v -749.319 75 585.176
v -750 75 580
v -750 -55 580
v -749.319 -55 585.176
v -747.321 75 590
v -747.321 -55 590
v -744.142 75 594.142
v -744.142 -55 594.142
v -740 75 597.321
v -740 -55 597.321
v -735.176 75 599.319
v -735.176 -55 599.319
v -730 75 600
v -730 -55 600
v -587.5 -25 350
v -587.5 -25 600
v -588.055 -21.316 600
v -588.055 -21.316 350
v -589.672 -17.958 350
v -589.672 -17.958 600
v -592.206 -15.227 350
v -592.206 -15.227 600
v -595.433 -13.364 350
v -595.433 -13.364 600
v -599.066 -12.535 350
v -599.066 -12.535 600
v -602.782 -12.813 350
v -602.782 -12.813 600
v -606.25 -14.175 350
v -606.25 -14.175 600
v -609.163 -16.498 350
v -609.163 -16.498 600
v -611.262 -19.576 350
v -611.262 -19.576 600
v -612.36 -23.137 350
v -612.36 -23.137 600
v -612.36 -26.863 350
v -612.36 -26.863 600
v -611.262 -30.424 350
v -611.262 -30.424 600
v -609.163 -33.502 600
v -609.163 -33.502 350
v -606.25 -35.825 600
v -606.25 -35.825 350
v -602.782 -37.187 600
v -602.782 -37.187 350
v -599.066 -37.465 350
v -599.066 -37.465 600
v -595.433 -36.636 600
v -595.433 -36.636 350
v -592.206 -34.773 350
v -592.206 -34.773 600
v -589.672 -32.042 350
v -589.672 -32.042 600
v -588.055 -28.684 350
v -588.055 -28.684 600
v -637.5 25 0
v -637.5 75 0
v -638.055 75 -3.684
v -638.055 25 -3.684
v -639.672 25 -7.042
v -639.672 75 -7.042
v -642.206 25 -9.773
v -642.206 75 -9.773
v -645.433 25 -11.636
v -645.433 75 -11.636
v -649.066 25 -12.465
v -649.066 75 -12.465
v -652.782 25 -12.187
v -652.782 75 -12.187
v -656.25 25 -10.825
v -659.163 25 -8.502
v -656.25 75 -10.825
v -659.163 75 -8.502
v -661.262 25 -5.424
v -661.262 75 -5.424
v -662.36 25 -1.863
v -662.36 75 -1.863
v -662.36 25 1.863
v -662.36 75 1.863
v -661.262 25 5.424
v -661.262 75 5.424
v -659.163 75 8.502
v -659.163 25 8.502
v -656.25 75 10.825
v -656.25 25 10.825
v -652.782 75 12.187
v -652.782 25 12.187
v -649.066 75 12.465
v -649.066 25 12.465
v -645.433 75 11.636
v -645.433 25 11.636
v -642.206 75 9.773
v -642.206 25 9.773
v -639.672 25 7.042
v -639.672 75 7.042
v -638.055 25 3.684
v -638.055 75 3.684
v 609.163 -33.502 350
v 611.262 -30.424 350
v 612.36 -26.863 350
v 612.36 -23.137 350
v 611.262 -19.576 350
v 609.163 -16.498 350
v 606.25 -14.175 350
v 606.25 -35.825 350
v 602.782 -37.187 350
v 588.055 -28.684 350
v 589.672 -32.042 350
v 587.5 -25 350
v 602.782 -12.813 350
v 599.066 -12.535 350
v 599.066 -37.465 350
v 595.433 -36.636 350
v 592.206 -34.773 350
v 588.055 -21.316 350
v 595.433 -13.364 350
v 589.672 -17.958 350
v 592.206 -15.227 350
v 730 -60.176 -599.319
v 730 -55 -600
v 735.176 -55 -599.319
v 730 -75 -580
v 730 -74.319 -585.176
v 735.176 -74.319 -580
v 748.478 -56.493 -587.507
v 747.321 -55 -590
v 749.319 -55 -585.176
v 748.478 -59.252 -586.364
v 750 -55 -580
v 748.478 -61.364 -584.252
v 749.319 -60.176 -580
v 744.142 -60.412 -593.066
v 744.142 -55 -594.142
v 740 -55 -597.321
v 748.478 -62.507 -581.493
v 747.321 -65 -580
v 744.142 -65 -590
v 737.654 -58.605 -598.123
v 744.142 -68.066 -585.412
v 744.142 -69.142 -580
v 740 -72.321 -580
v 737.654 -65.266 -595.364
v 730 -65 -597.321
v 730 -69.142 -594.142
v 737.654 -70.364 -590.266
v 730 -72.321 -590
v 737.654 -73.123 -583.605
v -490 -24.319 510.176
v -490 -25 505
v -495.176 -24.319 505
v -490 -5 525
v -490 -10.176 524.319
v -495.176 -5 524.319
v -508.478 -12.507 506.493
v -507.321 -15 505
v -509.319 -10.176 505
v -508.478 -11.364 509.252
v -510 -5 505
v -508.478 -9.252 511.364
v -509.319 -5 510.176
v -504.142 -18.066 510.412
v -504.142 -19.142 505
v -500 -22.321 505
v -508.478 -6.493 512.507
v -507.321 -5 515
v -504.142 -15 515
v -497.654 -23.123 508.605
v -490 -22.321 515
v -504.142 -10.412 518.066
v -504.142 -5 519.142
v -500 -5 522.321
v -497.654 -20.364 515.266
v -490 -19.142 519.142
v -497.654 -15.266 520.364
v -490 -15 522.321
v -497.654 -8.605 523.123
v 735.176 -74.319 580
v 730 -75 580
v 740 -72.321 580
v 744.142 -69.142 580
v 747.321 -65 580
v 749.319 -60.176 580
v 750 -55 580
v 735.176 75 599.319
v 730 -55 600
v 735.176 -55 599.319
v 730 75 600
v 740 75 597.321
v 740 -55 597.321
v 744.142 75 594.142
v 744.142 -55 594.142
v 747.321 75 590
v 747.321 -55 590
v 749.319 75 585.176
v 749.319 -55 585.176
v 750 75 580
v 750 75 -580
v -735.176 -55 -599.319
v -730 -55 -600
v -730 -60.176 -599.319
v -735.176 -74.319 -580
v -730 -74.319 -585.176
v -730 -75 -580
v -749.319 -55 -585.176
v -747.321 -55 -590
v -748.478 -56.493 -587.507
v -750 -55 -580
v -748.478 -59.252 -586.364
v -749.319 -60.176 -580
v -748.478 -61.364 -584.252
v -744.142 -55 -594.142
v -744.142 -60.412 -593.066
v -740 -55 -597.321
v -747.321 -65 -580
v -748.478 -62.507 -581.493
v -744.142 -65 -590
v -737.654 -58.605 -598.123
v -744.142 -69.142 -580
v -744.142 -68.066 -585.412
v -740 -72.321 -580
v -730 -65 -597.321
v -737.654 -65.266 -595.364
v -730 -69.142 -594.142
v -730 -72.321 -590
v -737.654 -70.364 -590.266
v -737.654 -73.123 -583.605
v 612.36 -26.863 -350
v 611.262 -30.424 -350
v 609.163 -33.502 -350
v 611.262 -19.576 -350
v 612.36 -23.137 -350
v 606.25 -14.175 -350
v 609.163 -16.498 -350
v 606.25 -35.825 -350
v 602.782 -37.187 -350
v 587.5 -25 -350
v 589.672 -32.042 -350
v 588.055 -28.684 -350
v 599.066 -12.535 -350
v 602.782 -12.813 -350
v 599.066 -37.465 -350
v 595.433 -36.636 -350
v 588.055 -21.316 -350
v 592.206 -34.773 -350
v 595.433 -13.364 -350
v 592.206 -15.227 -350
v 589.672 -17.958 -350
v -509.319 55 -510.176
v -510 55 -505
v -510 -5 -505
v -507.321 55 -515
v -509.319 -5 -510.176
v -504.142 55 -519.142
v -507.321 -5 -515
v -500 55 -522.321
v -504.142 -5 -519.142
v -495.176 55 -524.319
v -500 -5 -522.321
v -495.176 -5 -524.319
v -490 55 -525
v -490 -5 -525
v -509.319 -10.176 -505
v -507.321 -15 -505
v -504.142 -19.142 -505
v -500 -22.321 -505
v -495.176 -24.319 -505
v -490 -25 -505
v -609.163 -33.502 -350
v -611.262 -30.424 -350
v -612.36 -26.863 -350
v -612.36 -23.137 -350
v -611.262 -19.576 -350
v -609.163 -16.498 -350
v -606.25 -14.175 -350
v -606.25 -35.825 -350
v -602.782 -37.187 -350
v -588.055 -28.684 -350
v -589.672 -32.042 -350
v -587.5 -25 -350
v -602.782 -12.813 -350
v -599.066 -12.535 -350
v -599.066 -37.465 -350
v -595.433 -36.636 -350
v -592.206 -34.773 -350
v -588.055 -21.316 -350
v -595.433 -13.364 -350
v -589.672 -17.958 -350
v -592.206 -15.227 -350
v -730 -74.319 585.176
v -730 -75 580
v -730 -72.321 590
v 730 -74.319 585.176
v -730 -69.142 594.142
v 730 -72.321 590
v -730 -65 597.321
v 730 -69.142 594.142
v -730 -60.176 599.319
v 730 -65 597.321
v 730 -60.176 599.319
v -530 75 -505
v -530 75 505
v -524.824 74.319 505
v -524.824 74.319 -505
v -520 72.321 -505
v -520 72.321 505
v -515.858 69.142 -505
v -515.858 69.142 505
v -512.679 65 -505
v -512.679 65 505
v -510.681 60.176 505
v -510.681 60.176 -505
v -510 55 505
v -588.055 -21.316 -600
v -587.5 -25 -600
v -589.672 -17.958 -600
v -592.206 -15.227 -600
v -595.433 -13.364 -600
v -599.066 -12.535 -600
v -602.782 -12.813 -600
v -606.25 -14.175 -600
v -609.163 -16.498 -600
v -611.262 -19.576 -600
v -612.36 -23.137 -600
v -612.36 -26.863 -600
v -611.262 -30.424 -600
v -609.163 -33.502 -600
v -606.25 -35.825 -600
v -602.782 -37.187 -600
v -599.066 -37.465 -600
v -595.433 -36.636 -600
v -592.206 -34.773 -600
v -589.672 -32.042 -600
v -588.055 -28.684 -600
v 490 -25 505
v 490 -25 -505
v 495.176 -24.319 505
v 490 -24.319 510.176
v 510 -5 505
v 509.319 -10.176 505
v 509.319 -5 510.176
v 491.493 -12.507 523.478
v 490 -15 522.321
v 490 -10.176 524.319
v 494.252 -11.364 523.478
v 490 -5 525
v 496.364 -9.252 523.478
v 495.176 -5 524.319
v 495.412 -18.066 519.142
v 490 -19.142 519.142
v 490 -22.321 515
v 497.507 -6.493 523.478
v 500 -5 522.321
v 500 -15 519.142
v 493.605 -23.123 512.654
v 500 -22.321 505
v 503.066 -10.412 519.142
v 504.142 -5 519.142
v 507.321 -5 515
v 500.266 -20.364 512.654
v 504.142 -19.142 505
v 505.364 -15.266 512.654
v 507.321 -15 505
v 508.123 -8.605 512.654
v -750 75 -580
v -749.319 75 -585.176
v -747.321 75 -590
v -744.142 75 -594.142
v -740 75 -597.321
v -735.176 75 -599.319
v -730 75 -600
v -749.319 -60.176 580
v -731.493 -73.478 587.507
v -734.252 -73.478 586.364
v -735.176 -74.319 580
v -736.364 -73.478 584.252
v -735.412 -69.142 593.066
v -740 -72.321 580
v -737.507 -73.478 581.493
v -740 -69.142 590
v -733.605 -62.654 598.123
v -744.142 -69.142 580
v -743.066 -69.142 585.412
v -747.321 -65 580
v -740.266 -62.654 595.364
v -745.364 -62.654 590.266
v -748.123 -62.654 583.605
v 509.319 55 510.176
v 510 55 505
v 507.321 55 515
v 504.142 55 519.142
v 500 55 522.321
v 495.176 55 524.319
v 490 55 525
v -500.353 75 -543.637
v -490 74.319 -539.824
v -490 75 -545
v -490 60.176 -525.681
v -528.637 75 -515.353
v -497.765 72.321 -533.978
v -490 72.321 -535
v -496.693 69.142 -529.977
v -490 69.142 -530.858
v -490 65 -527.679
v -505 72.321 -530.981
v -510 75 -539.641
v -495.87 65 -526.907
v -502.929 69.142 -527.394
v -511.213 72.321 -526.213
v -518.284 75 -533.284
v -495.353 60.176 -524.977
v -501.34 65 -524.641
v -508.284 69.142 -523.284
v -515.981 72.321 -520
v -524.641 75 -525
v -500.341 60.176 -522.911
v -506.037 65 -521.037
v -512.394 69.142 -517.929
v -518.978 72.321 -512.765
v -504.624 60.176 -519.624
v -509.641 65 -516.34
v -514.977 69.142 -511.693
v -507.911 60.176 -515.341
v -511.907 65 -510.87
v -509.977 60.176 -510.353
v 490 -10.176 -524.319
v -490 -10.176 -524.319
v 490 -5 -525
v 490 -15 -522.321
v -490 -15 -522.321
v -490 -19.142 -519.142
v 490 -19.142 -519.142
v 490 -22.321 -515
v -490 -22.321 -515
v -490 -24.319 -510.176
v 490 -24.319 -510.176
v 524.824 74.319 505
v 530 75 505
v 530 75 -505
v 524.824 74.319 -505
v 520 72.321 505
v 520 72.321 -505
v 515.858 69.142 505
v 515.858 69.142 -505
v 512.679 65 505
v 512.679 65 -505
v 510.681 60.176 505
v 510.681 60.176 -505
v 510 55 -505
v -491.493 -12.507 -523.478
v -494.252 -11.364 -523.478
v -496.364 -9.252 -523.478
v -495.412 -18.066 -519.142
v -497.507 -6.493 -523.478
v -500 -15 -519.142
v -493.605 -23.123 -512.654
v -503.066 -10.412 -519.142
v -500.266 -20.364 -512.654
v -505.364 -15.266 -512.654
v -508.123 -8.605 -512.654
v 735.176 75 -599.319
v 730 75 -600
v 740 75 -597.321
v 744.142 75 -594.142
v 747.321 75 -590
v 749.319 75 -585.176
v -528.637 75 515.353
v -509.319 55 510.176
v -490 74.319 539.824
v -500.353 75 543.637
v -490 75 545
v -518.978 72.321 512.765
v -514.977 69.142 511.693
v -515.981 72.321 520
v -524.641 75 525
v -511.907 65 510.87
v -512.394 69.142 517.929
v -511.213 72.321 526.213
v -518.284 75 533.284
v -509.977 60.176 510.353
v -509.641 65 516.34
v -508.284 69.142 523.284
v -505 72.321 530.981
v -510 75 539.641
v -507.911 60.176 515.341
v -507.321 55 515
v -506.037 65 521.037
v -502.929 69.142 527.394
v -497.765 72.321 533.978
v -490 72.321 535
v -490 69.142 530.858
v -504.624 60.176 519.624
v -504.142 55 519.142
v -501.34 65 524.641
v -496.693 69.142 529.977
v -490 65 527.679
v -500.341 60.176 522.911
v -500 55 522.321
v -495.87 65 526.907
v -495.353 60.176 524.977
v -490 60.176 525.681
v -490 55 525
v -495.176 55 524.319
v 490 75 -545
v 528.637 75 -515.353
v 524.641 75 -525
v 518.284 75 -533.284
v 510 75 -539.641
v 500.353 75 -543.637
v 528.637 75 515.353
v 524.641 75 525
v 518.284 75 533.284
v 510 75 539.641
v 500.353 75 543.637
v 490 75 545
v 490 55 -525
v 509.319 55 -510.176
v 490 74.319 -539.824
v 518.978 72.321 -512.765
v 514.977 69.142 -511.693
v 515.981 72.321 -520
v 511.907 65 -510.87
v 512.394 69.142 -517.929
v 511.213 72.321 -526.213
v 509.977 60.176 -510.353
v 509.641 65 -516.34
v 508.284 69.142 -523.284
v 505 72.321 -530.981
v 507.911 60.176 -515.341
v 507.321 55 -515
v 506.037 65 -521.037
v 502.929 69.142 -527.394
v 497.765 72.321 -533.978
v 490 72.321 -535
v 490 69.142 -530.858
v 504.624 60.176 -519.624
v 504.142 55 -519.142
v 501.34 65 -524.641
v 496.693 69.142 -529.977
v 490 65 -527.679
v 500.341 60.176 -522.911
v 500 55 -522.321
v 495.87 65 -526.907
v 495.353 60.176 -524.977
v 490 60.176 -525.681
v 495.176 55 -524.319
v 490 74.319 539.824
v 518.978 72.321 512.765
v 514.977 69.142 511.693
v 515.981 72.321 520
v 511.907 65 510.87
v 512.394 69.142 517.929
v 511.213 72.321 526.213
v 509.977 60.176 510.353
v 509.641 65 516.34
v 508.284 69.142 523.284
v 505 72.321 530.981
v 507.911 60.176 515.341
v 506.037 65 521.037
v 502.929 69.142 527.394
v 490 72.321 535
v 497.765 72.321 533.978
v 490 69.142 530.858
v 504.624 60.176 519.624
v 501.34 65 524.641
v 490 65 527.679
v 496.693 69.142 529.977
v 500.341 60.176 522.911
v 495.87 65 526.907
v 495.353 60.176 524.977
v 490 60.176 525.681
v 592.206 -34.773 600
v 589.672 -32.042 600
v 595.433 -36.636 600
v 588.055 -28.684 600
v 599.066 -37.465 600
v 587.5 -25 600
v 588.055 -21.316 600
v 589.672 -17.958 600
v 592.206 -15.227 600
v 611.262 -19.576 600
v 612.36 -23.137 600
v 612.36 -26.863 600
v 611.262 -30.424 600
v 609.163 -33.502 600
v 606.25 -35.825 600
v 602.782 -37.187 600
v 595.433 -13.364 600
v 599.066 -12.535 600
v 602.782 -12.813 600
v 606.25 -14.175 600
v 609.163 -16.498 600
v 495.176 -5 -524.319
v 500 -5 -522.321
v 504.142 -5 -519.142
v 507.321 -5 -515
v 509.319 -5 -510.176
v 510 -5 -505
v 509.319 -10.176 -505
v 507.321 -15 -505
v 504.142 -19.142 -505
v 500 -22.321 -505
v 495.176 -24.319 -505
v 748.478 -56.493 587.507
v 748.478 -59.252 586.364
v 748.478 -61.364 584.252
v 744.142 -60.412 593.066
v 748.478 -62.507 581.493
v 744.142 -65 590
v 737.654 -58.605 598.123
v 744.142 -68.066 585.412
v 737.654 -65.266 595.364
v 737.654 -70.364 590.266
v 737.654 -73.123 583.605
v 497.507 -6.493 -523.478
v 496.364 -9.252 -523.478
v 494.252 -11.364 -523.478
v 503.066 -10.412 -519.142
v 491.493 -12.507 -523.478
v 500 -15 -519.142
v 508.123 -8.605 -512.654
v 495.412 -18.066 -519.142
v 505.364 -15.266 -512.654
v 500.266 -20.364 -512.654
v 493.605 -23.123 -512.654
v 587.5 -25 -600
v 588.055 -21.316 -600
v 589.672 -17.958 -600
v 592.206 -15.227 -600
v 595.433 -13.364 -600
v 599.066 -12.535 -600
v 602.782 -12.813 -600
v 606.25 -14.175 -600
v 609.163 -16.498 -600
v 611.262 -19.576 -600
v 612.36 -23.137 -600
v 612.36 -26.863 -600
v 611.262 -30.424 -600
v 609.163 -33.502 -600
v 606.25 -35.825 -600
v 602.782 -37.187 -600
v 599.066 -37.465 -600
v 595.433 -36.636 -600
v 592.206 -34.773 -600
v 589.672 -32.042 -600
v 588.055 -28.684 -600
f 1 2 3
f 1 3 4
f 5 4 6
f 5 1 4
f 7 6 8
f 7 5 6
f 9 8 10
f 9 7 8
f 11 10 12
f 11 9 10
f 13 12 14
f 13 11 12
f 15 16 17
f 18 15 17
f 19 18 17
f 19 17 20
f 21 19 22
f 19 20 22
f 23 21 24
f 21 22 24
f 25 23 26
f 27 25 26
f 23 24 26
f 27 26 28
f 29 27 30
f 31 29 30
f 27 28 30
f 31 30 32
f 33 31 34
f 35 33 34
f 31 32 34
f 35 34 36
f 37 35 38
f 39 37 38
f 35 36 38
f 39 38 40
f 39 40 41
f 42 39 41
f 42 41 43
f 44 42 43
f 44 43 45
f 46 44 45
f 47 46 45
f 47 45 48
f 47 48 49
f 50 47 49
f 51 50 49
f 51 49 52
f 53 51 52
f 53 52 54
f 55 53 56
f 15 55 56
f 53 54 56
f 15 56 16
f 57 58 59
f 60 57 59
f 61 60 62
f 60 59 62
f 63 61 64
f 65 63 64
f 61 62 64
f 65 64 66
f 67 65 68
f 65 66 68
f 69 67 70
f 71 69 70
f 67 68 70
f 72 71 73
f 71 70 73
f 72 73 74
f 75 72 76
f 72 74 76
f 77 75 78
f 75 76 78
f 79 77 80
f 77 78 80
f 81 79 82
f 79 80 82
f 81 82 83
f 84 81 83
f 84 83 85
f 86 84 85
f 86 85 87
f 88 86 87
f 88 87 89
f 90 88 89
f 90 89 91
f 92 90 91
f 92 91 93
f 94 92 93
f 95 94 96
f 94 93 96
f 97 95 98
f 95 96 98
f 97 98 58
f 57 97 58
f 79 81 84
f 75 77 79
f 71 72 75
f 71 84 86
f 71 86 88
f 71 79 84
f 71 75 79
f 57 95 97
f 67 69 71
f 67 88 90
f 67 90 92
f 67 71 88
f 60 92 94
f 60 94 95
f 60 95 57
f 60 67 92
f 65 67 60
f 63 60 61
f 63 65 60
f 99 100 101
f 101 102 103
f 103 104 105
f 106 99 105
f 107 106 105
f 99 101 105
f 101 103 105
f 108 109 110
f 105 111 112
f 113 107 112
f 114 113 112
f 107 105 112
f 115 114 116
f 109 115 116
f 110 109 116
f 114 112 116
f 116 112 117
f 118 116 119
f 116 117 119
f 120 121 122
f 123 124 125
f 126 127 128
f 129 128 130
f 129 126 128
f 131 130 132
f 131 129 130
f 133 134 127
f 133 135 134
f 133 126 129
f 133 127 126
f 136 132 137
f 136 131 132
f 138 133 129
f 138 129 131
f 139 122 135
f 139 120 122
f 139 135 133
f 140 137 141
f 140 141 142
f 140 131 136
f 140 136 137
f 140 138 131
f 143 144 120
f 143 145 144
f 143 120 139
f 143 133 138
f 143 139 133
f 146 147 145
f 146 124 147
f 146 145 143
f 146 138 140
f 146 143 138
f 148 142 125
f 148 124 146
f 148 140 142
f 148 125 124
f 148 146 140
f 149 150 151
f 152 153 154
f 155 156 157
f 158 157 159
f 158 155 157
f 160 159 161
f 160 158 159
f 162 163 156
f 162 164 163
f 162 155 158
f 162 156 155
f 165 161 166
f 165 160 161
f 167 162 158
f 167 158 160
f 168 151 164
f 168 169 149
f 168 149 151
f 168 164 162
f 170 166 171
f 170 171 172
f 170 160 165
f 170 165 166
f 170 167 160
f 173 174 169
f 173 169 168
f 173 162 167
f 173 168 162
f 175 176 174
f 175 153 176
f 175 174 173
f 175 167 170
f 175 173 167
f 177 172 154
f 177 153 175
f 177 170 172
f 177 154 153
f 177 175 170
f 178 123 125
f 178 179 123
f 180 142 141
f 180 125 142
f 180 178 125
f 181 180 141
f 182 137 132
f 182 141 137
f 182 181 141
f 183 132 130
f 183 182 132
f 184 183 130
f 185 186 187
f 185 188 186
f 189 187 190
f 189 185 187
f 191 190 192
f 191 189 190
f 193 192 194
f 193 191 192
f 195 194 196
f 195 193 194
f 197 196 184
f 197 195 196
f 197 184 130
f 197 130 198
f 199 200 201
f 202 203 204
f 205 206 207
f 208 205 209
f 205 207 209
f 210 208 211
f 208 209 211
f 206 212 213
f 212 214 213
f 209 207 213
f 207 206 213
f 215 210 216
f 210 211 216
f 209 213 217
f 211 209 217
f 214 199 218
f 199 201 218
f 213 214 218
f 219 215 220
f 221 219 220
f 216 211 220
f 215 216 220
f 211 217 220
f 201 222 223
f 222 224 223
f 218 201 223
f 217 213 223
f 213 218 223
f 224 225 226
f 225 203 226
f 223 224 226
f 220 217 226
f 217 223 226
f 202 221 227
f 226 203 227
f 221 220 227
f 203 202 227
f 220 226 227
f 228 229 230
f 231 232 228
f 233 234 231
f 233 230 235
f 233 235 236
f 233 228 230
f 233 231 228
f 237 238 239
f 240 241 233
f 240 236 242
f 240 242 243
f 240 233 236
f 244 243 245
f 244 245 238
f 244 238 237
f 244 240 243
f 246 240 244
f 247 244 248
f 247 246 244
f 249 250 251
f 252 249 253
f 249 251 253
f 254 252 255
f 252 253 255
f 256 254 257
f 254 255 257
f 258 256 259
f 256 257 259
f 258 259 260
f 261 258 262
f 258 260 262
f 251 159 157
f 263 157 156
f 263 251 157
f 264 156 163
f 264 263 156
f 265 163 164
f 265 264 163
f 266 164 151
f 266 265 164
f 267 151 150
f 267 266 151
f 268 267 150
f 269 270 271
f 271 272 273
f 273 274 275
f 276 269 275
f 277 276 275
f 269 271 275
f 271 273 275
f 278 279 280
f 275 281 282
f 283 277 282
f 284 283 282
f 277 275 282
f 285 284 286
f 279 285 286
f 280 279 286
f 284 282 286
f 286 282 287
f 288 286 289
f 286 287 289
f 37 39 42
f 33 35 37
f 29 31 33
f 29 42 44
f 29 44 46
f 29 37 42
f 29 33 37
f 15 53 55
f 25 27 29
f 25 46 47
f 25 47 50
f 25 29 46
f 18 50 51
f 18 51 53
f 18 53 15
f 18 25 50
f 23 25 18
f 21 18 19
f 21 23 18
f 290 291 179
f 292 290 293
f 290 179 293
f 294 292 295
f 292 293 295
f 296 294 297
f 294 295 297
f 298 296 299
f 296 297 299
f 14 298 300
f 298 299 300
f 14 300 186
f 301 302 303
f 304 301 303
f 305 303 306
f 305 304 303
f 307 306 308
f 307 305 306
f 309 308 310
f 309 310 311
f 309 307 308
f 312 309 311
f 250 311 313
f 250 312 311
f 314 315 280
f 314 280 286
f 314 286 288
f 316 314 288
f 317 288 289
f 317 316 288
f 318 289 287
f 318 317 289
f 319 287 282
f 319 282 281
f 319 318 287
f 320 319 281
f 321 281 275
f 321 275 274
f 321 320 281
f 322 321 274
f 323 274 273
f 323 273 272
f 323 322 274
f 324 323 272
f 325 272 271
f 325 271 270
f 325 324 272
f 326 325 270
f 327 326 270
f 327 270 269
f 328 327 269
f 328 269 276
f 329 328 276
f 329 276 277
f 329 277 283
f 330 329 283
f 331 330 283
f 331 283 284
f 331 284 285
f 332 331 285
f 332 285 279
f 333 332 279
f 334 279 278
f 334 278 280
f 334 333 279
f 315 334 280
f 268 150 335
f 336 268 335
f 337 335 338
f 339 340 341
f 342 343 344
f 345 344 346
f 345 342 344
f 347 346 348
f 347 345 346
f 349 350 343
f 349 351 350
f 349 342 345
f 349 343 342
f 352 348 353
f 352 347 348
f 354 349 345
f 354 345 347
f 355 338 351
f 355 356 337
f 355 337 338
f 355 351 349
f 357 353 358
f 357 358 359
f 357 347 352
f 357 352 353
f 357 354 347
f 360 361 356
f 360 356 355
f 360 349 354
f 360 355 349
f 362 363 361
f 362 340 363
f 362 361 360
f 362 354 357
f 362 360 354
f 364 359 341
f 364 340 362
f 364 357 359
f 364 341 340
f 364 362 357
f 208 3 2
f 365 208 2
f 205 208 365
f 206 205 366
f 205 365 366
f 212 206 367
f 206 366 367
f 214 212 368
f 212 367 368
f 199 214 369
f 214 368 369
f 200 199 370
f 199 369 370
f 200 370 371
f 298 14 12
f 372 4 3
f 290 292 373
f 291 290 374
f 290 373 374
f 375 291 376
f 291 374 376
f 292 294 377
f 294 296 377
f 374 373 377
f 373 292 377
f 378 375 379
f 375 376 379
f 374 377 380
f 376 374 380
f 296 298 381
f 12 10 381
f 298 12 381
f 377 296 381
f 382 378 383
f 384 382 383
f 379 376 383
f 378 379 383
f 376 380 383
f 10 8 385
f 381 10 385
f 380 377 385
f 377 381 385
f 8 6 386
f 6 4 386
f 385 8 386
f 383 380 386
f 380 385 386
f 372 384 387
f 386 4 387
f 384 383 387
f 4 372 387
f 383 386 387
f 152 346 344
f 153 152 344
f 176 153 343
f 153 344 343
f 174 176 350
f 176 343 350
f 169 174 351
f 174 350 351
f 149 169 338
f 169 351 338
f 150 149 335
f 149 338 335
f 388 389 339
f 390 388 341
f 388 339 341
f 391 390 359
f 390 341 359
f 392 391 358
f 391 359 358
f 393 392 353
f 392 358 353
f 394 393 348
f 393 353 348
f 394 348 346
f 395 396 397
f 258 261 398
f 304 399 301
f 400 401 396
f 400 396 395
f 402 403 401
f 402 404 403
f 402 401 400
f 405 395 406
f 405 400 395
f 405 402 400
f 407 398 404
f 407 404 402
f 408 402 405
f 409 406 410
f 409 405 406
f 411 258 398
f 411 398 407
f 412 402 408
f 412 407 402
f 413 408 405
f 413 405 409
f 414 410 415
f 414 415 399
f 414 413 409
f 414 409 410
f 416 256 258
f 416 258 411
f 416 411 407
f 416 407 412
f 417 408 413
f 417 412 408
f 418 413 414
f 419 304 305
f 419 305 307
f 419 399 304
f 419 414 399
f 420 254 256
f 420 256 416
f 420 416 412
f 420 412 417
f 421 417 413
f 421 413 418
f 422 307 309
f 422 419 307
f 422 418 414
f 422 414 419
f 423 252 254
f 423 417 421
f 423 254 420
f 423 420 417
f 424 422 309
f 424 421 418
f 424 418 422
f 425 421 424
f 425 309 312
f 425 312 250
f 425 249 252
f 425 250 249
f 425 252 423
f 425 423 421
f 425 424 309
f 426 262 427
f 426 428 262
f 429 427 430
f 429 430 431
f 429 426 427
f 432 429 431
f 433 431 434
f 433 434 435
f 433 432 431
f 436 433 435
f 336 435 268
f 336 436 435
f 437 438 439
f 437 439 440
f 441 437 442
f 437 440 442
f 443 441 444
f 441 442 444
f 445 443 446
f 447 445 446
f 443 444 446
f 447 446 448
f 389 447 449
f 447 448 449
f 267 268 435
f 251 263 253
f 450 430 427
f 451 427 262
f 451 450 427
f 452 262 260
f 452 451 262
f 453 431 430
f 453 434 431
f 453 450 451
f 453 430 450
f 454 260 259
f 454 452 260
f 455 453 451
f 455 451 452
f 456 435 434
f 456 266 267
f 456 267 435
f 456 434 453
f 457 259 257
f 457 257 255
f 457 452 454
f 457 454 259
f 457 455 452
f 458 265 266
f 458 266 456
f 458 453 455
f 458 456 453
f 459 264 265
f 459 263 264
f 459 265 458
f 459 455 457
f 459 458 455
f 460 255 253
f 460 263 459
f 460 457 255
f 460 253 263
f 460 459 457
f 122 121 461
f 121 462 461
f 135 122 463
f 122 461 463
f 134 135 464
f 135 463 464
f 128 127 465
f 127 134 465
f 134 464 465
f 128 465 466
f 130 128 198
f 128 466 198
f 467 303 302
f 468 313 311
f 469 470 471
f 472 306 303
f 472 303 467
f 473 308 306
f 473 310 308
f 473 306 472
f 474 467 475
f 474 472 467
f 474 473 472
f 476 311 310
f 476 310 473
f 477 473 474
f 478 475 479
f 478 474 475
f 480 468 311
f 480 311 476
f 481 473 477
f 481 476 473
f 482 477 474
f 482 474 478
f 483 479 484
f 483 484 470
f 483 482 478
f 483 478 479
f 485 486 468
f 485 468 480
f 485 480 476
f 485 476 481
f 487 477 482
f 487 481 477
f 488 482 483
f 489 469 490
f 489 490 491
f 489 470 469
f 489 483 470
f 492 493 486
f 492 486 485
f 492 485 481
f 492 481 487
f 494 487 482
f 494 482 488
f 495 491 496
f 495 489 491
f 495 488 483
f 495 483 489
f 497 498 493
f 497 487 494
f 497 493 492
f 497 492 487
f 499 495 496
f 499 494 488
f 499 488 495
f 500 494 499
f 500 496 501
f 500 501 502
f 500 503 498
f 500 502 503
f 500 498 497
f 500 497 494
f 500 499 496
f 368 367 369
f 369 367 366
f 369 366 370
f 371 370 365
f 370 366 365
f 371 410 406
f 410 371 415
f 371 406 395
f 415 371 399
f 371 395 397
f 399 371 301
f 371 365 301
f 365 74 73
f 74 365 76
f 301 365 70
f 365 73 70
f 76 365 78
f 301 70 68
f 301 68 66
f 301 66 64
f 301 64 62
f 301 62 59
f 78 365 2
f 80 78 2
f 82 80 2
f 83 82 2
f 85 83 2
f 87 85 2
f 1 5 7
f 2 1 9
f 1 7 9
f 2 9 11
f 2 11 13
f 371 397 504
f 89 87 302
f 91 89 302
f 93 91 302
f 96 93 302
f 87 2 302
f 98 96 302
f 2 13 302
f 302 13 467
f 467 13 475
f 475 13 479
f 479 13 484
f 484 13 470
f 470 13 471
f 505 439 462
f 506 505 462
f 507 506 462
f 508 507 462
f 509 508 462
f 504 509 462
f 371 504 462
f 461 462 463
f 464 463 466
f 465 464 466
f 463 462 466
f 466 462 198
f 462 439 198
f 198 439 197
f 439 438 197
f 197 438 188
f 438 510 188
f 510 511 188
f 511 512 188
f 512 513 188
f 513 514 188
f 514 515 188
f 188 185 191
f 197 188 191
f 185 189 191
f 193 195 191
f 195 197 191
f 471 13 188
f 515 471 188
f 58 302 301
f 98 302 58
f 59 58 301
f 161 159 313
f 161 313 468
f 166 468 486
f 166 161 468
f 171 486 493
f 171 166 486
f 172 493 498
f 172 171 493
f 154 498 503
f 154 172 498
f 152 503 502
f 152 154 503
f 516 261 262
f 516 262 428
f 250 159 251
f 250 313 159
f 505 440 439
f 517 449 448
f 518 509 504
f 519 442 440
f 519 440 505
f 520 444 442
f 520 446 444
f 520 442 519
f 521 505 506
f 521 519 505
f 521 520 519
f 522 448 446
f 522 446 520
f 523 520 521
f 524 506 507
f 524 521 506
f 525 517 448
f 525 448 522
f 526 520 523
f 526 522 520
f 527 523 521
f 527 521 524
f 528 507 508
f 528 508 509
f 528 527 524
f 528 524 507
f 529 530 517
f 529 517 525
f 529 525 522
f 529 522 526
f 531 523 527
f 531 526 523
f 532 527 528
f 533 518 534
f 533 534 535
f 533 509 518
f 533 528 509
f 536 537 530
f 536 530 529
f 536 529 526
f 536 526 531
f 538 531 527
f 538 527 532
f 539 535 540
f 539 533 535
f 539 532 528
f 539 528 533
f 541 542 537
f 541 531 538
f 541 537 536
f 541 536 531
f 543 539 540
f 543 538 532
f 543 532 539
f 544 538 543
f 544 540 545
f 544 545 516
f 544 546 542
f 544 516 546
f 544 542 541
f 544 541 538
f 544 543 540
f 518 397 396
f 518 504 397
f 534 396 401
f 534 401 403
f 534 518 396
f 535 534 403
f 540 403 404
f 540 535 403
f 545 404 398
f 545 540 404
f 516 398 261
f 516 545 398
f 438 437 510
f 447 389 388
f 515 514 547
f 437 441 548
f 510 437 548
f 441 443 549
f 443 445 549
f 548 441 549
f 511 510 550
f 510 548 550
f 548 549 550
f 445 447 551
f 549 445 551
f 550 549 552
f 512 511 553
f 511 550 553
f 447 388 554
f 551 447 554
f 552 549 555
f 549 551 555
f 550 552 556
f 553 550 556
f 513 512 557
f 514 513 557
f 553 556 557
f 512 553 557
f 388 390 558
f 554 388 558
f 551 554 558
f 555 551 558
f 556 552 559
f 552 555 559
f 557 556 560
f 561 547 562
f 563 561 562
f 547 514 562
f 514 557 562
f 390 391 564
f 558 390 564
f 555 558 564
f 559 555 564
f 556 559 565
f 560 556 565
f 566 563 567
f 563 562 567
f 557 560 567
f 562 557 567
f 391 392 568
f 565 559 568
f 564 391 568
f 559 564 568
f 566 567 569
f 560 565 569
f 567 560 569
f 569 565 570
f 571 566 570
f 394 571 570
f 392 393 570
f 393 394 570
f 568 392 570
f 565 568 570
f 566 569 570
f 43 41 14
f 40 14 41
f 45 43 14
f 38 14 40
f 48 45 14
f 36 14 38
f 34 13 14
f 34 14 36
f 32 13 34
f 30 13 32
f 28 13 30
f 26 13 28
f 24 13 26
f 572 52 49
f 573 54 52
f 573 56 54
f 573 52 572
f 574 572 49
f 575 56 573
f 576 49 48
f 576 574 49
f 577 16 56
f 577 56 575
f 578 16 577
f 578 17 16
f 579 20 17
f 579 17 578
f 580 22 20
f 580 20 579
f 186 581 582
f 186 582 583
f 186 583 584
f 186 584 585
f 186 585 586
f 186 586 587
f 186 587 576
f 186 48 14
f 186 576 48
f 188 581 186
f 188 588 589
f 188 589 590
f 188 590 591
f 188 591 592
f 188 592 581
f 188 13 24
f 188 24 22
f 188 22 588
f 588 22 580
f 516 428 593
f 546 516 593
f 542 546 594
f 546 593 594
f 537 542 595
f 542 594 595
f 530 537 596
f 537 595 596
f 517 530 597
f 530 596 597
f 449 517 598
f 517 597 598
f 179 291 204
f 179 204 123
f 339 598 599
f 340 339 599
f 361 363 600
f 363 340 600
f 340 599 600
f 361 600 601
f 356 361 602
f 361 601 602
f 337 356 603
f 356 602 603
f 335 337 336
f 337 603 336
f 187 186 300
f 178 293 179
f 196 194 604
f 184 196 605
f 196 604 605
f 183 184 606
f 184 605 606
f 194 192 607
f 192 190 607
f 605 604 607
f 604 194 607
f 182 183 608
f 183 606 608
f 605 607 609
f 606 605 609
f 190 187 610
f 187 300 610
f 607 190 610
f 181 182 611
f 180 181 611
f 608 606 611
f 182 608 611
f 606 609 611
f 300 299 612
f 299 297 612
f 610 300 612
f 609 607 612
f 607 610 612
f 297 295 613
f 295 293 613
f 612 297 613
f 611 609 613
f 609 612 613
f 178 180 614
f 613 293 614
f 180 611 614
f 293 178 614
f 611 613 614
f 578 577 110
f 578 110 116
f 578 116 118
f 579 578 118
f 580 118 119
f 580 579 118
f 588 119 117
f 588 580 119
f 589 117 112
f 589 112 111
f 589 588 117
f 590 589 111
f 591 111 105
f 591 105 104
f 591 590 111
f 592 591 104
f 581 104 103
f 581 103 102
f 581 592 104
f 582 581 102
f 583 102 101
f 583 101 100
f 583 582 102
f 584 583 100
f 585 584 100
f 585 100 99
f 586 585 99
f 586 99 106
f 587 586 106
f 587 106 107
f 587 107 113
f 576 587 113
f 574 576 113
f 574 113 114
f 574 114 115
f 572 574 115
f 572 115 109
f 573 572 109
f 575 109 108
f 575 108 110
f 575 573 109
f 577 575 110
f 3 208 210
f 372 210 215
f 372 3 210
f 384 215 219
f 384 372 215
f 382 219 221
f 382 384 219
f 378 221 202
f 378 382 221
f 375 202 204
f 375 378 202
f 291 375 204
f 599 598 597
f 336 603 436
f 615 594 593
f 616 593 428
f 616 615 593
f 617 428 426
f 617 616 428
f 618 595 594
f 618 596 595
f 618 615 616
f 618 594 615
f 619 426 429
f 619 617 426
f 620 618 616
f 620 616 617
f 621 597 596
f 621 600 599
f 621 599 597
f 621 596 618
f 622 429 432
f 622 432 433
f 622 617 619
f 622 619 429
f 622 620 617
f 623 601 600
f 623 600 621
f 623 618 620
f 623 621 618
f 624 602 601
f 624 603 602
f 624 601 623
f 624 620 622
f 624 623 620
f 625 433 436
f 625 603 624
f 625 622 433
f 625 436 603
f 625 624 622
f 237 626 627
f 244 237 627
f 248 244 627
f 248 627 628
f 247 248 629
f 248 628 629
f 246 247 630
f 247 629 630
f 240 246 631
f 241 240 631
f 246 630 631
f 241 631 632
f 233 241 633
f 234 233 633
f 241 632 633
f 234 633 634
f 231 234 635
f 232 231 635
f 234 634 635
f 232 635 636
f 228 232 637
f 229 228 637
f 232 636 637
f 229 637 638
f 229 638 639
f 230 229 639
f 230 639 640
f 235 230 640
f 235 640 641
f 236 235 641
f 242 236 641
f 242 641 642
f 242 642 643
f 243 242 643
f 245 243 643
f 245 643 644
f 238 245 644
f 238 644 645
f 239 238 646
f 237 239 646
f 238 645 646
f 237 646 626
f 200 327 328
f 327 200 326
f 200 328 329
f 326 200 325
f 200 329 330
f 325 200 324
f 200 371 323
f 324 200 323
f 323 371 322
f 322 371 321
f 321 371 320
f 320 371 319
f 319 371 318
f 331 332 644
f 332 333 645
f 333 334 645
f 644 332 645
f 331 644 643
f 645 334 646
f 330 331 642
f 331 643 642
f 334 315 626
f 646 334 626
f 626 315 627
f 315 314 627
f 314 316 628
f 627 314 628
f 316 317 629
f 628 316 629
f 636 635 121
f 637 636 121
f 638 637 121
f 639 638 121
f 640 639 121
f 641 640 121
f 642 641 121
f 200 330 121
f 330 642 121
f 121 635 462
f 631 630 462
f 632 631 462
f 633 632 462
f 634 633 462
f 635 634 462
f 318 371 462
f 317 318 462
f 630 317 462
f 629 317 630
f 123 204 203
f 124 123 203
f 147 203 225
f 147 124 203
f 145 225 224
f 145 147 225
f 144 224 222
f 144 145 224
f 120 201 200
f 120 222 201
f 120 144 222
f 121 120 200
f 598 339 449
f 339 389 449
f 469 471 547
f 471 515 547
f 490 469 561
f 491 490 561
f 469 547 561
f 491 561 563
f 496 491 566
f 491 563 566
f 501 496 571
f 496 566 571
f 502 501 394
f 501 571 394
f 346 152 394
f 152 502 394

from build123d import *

# Parameters (mm, degrees)
SKETCH2_W               = 1500
SKETCH2_H               = 150
BOSS_EXTRUDE1_DEPTH     = 600
SKETCH3_R               = 12.5
CUT_EXTRUDE2_DEPTH      = 250
MIRROR3_COPY_1_SKETCH_R = 12.5
MIRROR3_COPY_1_DEPTH    = 250
SKETCH4_R               = 12.5
CUT_EXTRUDE3_DEPTH      = 50
SKETCH5_W               = 1020
SKETCH5_H               = 1050
CUT_EXTRUDE4_DEPTH      = 100
FILLET1_R               = 20


with BuildPart() as part:
    # Sketch2 → Boss-Extrude1 (new body, symmetric)
    with BuildSketch(Plane.XY):
        Rectangle(SKETCH2_W, SKETCH2_H)
    extrude(amount=BOSS_EXTRUDE1_DEPTH, both=True)

    # Sketch3 → Cut-Extrude2 (cut)
    with BuildSketch(Plane.XY.offset(600)):
        with Locations((-600, -25)):
            Circle(SKETCH3_R)
    cut_extrude2 = extrude(amount=-CUT_EXTRUDE2_DEPTH, mode=Mode.SUBTRACT)

    # Mirror2: Cut-Extrude2 across plane
    add(cut_extrude2.mirror(Plane(origin=(0, 0, 0), x_dir=(0, 0, 1), z_dir=(1, 0, 0))), mode=Mode.SUBTRACT)

    # Mirror3: Cut-Extrude2 across plane
    add(cut_extrude2.mirror(Plane.XY), mode=Mode.SUBTRACT)

    # Mirror3 copy 1 sketch → Mirror3 copy 1 (cut)
    with BuildSketch(Plane(origin=(0, 0, -600), x_dir=(-1, 0, 0), z_dir=(0, 0, -1))):
        with Locations((-600, -25)):
            Circle(MIRROR3_COPY_1_SKETCH_R)
    extrude(amount=-MIRROR3_COPY_1_DEPTH, mode=Mode.SUBTRACT)

    # Sketch4 → Cut-Extrude3 (cut)
    with BuildSketch(Plane(origin=(0, 75, 0), x_dir=(1, 0, 0), z_dir=(0, 1, 0))):
        with Locations((-650, 0)):
            Circle(SKETCH4_R)
    extrude(amount=-CUT_EXTRUDE3_DEPTH, mode=Mode.SUBTRACT)

    # Sketch5 → Cut-Extrude4 (cut)
    with BuildSketch(Plane(origin=(0, 75, 0), x_dir=(1, 0, 0), z_dir=(0, 1, 0))):
        Rectangle(SKETCH5_W, SKETCH5_H)
    extrude(amount=-CUT_EXTRUDE4_DEPTH, mode=Mode.SUBTRACT)

    # Fillet1
    fillet1_edges = [part.edges().sort_by_distance(p)[0] for p in [
        (-750, 0, 600),
        (0, -75, 600),
        (510, -25, 0),
        (510, 25, -525),
        (0, -25, 525),
        (510, 25, 525),
        (-510, -25, 0),
        (-510, 25, 525),
        (0, -25, -525),
        (-510, 25, -525),
        (510, 75, 0),
        (0, 75, -525),
        (-510, 75, 0),
        (0, 75, 525),
        (750, 0, 600),
        (0, -75, -600),
        (-750, 0, -600),
        (750, 0, -600),
        (750, -75, 0),
        (-750, -75, 0),
    ]]
    fillet(fillet1_edges, radius=FILLET1_R)


solid = part.part
